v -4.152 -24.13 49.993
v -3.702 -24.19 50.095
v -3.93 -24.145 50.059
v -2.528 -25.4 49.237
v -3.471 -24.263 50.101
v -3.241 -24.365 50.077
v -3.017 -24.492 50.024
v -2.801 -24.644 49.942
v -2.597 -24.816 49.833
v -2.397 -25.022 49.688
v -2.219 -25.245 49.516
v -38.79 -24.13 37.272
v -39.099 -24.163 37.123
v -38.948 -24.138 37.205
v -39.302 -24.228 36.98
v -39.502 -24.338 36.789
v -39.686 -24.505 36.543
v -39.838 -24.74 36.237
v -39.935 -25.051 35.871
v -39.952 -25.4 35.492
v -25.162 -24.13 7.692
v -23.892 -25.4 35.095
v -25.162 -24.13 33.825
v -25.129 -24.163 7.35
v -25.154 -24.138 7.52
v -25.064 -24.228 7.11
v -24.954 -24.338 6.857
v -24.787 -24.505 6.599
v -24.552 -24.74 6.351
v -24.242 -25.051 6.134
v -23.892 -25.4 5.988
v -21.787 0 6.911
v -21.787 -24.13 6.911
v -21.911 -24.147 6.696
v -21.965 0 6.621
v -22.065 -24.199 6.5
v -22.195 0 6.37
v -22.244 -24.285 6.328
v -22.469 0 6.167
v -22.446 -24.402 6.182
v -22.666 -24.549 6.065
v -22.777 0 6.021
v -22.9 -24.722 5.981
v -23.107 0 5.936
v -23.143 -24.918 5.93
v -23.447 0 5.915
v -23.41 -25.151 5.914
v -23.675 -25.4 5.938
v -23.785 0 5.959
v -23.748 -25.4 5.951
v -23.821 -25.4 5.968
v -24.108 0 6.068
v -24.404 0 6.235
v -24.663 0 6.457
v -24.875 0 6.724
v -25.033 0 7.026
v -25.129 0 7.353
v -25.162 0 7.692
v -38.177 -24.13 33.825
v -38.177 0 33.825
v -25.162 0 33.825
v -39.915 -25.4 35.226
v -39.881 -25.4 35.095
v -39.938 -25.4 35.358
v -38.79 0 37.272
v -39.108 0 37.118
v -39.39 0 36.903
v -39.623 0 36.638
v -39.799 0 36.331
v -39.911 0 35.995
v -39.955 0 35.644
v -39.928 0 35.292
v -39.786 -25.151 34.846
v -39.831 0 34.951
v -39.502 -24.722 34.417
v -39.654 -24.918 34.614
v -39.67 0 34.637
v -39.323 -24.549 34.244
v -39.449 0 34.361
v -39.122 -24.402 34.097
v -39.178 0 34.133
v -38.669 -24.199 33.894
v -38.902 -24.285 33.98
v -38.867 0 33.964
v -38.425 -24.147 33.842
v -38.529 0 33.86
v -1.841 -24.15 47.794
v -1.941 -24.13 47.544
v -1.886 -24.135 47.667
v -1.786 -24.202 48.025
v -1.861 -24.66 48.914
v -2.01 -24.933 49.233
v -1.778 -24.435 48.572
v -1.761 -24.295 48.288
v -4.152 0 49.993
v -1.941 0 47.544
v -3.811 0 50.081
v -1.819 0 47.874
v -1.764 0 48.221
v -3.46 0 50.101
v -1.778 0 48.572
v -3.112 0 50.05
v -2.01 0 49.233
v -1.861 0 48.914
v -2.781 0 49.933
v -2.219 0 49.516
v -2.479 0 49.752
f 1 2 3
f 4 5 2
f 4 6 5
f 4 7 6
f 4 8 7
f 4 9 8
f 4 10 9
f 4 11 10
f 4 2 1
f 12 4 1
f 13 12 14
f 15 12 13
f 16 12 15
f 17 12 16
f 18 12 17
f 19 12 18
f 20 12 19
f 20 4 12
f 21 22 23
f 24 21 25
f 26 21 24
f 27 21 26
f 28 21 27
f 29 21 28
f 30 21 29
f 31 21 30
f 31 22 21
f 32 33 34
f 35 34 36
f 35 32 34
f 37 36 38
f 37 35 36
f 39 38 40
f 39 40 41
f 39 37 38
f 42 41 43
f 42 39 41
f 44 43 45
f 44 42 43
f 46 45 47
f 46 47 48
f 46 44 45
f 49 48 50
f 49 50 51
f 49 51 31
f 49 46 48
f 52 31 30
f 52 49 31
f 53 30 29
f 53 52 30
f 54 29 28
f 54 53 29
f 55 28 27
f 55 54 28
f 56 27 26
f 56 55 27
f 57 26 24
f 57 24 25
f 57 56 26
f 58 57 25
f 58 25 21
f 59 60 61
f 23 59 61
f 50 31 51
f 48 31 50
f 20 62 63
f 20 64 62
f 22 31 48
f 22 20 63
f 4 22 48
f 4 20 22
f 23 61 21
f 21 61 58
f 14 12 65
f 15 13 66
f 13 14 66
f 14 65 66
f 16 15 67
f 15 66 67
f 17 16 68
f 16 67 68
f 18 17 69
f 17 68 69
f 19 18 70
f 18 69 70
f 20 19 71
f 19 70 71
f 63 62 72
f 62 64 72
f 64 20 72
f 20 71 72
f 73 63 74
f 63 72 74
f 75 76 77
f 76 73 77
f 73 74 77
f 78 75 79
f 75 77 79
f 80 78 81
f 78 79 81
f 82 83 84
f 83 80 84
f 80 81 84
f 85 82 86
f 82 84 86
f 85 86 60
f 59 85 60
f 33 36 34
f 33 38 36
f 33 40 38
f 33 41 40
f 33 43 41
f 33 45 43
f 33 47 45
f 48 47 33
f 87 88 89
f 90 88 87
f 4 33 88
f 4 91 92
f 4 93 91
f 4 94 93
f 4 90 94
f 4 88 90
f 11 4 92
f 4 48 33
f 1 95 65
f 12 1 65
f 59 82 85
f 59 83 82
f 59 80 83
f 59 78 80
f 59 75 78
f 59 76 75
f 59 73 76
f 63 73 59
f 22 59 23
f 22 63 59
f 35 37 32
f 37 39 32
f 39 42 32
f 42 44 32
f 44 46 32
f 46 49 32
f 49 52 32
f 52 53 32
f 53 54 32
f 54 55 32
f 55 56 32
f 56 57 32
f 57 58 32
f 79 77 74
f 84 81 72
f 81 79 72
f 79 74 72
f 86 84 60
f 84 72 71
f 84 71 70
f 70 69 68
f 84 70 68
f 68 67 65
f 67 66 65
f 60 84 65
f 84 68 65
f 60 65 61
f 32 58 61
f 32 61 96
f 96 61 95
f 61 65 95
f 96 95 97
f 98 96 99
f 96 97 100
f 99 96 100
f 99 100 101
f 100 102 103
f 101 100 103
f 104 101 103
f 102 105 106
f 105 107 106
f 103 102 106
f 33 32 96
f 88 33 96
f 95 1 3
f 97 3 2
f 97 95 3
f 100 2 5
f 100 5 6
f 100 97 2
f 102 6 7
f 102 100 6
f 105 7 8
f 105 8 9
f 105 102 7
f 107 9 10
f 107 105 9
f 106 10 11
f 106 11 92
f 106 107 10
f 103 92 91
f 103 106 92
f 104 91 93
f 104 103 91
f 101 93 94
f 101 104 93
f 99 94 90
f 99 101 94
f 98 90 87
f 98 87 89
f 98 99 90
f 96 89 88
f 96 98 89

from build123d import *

# Parameters (mm, degrees)
F1_DEPTH    = 25.4
F2_SIZE     = 1.27
F3_T1_DEPTH = 62.588590634
F3_T3_DEPTH = 46.2433618017
F3_T5_DEPTH = 74.1232333831


# Not quite as in the source:
# - a fillet or chamfer that OpenCascade refuses, or shapes differently, is made with other operations: its cross-section is extruded or revolved along the edge and cut away or added


with BuildPart() as f1:
    # F0 (on Front) → F1 (new body)
    with BuildSketch(Plane.XZ):
        Polygon((0, 51.5181273222), (-48.1757372618, 33.8250361383), (-25.1621361822, 33.8250361383), (-25.1621361822, 0), align=None)
    extrude(amount=F1_DEPTH)

    # F2
    f2_edges = [f1.edges().sort_by_distance(p)[0] for p in [
        (-25.162136, -25.4, 16.912518),
        (-12.581068, -25.4, 25.759064),
        (-36.668937, -25.4, 33.825036),
        (-24.087869, -25.4, 42.671582),
    ]]
    chamfer(f2_edges, length=F2_SIZE)

    # F3: fillet of radius 1.778 on 3 edges, made by hand

    # F3_s2 → F3_t1 (cut)
    with BuildSketch(Plane.XZ.offset(-19.229295317)):
        with BuildLine():
            ThreePointArc((-21.78650907, 6.911415871), (-23.7845753127, 5.9593981498), (-25.1621361822, 7.6917181268))
            Line((-25.1621361822, 7.6917181268), (-25.1621361822, 0))
            Line((-25.1621361822, 0), (-21.78650907, 6.911415871))
        make_face()
    extrude(amount=F3_T1_DEPTH, mode=Mode.SUBTRACT)

    # F3_s4 → F3_t3 (cut)
    with BuildSketch(Plane.XZ.offset(-11.0566809008)):
        with BuildLine():
            ThreePointArc((-4.1515436611, 49.9934253721), (-2.2186732944, 49.5156925609), (-1.9409568164, 47.5441221078))
            Line((-1.9409568164, 47.5441221078), (0, 51.5181273222))
            Line((0, 51.5181273222), (-4.1515436611, 49.9934253721))
        make_face()
    extrude(amount=F3_T3_DEPTH, mode=Mode.SUBTRACT)

    # F3_s6 → F3_t5 (cut)
    with BuildSketch(Plane.XZ.offset(-24.9966166916)):
        with BuildLine():
            ThreePointArc((-38.7900503177, 37.2720371468), (-39.9276287585, 35.2917483238), (-38.1770905851, 33.8250361383))
            Line((-38.1770905851, 33.8250361383), (-48.1757372618, 33.8250361383))
            Line((-48.1757372618, 33.8250361383), (-38.7900503177, 37.2720371468))
        make_face()
    extrude(amount=F3_T5_DEPTH, mode=Mode.SUBTRACT)


solid = f1.part
